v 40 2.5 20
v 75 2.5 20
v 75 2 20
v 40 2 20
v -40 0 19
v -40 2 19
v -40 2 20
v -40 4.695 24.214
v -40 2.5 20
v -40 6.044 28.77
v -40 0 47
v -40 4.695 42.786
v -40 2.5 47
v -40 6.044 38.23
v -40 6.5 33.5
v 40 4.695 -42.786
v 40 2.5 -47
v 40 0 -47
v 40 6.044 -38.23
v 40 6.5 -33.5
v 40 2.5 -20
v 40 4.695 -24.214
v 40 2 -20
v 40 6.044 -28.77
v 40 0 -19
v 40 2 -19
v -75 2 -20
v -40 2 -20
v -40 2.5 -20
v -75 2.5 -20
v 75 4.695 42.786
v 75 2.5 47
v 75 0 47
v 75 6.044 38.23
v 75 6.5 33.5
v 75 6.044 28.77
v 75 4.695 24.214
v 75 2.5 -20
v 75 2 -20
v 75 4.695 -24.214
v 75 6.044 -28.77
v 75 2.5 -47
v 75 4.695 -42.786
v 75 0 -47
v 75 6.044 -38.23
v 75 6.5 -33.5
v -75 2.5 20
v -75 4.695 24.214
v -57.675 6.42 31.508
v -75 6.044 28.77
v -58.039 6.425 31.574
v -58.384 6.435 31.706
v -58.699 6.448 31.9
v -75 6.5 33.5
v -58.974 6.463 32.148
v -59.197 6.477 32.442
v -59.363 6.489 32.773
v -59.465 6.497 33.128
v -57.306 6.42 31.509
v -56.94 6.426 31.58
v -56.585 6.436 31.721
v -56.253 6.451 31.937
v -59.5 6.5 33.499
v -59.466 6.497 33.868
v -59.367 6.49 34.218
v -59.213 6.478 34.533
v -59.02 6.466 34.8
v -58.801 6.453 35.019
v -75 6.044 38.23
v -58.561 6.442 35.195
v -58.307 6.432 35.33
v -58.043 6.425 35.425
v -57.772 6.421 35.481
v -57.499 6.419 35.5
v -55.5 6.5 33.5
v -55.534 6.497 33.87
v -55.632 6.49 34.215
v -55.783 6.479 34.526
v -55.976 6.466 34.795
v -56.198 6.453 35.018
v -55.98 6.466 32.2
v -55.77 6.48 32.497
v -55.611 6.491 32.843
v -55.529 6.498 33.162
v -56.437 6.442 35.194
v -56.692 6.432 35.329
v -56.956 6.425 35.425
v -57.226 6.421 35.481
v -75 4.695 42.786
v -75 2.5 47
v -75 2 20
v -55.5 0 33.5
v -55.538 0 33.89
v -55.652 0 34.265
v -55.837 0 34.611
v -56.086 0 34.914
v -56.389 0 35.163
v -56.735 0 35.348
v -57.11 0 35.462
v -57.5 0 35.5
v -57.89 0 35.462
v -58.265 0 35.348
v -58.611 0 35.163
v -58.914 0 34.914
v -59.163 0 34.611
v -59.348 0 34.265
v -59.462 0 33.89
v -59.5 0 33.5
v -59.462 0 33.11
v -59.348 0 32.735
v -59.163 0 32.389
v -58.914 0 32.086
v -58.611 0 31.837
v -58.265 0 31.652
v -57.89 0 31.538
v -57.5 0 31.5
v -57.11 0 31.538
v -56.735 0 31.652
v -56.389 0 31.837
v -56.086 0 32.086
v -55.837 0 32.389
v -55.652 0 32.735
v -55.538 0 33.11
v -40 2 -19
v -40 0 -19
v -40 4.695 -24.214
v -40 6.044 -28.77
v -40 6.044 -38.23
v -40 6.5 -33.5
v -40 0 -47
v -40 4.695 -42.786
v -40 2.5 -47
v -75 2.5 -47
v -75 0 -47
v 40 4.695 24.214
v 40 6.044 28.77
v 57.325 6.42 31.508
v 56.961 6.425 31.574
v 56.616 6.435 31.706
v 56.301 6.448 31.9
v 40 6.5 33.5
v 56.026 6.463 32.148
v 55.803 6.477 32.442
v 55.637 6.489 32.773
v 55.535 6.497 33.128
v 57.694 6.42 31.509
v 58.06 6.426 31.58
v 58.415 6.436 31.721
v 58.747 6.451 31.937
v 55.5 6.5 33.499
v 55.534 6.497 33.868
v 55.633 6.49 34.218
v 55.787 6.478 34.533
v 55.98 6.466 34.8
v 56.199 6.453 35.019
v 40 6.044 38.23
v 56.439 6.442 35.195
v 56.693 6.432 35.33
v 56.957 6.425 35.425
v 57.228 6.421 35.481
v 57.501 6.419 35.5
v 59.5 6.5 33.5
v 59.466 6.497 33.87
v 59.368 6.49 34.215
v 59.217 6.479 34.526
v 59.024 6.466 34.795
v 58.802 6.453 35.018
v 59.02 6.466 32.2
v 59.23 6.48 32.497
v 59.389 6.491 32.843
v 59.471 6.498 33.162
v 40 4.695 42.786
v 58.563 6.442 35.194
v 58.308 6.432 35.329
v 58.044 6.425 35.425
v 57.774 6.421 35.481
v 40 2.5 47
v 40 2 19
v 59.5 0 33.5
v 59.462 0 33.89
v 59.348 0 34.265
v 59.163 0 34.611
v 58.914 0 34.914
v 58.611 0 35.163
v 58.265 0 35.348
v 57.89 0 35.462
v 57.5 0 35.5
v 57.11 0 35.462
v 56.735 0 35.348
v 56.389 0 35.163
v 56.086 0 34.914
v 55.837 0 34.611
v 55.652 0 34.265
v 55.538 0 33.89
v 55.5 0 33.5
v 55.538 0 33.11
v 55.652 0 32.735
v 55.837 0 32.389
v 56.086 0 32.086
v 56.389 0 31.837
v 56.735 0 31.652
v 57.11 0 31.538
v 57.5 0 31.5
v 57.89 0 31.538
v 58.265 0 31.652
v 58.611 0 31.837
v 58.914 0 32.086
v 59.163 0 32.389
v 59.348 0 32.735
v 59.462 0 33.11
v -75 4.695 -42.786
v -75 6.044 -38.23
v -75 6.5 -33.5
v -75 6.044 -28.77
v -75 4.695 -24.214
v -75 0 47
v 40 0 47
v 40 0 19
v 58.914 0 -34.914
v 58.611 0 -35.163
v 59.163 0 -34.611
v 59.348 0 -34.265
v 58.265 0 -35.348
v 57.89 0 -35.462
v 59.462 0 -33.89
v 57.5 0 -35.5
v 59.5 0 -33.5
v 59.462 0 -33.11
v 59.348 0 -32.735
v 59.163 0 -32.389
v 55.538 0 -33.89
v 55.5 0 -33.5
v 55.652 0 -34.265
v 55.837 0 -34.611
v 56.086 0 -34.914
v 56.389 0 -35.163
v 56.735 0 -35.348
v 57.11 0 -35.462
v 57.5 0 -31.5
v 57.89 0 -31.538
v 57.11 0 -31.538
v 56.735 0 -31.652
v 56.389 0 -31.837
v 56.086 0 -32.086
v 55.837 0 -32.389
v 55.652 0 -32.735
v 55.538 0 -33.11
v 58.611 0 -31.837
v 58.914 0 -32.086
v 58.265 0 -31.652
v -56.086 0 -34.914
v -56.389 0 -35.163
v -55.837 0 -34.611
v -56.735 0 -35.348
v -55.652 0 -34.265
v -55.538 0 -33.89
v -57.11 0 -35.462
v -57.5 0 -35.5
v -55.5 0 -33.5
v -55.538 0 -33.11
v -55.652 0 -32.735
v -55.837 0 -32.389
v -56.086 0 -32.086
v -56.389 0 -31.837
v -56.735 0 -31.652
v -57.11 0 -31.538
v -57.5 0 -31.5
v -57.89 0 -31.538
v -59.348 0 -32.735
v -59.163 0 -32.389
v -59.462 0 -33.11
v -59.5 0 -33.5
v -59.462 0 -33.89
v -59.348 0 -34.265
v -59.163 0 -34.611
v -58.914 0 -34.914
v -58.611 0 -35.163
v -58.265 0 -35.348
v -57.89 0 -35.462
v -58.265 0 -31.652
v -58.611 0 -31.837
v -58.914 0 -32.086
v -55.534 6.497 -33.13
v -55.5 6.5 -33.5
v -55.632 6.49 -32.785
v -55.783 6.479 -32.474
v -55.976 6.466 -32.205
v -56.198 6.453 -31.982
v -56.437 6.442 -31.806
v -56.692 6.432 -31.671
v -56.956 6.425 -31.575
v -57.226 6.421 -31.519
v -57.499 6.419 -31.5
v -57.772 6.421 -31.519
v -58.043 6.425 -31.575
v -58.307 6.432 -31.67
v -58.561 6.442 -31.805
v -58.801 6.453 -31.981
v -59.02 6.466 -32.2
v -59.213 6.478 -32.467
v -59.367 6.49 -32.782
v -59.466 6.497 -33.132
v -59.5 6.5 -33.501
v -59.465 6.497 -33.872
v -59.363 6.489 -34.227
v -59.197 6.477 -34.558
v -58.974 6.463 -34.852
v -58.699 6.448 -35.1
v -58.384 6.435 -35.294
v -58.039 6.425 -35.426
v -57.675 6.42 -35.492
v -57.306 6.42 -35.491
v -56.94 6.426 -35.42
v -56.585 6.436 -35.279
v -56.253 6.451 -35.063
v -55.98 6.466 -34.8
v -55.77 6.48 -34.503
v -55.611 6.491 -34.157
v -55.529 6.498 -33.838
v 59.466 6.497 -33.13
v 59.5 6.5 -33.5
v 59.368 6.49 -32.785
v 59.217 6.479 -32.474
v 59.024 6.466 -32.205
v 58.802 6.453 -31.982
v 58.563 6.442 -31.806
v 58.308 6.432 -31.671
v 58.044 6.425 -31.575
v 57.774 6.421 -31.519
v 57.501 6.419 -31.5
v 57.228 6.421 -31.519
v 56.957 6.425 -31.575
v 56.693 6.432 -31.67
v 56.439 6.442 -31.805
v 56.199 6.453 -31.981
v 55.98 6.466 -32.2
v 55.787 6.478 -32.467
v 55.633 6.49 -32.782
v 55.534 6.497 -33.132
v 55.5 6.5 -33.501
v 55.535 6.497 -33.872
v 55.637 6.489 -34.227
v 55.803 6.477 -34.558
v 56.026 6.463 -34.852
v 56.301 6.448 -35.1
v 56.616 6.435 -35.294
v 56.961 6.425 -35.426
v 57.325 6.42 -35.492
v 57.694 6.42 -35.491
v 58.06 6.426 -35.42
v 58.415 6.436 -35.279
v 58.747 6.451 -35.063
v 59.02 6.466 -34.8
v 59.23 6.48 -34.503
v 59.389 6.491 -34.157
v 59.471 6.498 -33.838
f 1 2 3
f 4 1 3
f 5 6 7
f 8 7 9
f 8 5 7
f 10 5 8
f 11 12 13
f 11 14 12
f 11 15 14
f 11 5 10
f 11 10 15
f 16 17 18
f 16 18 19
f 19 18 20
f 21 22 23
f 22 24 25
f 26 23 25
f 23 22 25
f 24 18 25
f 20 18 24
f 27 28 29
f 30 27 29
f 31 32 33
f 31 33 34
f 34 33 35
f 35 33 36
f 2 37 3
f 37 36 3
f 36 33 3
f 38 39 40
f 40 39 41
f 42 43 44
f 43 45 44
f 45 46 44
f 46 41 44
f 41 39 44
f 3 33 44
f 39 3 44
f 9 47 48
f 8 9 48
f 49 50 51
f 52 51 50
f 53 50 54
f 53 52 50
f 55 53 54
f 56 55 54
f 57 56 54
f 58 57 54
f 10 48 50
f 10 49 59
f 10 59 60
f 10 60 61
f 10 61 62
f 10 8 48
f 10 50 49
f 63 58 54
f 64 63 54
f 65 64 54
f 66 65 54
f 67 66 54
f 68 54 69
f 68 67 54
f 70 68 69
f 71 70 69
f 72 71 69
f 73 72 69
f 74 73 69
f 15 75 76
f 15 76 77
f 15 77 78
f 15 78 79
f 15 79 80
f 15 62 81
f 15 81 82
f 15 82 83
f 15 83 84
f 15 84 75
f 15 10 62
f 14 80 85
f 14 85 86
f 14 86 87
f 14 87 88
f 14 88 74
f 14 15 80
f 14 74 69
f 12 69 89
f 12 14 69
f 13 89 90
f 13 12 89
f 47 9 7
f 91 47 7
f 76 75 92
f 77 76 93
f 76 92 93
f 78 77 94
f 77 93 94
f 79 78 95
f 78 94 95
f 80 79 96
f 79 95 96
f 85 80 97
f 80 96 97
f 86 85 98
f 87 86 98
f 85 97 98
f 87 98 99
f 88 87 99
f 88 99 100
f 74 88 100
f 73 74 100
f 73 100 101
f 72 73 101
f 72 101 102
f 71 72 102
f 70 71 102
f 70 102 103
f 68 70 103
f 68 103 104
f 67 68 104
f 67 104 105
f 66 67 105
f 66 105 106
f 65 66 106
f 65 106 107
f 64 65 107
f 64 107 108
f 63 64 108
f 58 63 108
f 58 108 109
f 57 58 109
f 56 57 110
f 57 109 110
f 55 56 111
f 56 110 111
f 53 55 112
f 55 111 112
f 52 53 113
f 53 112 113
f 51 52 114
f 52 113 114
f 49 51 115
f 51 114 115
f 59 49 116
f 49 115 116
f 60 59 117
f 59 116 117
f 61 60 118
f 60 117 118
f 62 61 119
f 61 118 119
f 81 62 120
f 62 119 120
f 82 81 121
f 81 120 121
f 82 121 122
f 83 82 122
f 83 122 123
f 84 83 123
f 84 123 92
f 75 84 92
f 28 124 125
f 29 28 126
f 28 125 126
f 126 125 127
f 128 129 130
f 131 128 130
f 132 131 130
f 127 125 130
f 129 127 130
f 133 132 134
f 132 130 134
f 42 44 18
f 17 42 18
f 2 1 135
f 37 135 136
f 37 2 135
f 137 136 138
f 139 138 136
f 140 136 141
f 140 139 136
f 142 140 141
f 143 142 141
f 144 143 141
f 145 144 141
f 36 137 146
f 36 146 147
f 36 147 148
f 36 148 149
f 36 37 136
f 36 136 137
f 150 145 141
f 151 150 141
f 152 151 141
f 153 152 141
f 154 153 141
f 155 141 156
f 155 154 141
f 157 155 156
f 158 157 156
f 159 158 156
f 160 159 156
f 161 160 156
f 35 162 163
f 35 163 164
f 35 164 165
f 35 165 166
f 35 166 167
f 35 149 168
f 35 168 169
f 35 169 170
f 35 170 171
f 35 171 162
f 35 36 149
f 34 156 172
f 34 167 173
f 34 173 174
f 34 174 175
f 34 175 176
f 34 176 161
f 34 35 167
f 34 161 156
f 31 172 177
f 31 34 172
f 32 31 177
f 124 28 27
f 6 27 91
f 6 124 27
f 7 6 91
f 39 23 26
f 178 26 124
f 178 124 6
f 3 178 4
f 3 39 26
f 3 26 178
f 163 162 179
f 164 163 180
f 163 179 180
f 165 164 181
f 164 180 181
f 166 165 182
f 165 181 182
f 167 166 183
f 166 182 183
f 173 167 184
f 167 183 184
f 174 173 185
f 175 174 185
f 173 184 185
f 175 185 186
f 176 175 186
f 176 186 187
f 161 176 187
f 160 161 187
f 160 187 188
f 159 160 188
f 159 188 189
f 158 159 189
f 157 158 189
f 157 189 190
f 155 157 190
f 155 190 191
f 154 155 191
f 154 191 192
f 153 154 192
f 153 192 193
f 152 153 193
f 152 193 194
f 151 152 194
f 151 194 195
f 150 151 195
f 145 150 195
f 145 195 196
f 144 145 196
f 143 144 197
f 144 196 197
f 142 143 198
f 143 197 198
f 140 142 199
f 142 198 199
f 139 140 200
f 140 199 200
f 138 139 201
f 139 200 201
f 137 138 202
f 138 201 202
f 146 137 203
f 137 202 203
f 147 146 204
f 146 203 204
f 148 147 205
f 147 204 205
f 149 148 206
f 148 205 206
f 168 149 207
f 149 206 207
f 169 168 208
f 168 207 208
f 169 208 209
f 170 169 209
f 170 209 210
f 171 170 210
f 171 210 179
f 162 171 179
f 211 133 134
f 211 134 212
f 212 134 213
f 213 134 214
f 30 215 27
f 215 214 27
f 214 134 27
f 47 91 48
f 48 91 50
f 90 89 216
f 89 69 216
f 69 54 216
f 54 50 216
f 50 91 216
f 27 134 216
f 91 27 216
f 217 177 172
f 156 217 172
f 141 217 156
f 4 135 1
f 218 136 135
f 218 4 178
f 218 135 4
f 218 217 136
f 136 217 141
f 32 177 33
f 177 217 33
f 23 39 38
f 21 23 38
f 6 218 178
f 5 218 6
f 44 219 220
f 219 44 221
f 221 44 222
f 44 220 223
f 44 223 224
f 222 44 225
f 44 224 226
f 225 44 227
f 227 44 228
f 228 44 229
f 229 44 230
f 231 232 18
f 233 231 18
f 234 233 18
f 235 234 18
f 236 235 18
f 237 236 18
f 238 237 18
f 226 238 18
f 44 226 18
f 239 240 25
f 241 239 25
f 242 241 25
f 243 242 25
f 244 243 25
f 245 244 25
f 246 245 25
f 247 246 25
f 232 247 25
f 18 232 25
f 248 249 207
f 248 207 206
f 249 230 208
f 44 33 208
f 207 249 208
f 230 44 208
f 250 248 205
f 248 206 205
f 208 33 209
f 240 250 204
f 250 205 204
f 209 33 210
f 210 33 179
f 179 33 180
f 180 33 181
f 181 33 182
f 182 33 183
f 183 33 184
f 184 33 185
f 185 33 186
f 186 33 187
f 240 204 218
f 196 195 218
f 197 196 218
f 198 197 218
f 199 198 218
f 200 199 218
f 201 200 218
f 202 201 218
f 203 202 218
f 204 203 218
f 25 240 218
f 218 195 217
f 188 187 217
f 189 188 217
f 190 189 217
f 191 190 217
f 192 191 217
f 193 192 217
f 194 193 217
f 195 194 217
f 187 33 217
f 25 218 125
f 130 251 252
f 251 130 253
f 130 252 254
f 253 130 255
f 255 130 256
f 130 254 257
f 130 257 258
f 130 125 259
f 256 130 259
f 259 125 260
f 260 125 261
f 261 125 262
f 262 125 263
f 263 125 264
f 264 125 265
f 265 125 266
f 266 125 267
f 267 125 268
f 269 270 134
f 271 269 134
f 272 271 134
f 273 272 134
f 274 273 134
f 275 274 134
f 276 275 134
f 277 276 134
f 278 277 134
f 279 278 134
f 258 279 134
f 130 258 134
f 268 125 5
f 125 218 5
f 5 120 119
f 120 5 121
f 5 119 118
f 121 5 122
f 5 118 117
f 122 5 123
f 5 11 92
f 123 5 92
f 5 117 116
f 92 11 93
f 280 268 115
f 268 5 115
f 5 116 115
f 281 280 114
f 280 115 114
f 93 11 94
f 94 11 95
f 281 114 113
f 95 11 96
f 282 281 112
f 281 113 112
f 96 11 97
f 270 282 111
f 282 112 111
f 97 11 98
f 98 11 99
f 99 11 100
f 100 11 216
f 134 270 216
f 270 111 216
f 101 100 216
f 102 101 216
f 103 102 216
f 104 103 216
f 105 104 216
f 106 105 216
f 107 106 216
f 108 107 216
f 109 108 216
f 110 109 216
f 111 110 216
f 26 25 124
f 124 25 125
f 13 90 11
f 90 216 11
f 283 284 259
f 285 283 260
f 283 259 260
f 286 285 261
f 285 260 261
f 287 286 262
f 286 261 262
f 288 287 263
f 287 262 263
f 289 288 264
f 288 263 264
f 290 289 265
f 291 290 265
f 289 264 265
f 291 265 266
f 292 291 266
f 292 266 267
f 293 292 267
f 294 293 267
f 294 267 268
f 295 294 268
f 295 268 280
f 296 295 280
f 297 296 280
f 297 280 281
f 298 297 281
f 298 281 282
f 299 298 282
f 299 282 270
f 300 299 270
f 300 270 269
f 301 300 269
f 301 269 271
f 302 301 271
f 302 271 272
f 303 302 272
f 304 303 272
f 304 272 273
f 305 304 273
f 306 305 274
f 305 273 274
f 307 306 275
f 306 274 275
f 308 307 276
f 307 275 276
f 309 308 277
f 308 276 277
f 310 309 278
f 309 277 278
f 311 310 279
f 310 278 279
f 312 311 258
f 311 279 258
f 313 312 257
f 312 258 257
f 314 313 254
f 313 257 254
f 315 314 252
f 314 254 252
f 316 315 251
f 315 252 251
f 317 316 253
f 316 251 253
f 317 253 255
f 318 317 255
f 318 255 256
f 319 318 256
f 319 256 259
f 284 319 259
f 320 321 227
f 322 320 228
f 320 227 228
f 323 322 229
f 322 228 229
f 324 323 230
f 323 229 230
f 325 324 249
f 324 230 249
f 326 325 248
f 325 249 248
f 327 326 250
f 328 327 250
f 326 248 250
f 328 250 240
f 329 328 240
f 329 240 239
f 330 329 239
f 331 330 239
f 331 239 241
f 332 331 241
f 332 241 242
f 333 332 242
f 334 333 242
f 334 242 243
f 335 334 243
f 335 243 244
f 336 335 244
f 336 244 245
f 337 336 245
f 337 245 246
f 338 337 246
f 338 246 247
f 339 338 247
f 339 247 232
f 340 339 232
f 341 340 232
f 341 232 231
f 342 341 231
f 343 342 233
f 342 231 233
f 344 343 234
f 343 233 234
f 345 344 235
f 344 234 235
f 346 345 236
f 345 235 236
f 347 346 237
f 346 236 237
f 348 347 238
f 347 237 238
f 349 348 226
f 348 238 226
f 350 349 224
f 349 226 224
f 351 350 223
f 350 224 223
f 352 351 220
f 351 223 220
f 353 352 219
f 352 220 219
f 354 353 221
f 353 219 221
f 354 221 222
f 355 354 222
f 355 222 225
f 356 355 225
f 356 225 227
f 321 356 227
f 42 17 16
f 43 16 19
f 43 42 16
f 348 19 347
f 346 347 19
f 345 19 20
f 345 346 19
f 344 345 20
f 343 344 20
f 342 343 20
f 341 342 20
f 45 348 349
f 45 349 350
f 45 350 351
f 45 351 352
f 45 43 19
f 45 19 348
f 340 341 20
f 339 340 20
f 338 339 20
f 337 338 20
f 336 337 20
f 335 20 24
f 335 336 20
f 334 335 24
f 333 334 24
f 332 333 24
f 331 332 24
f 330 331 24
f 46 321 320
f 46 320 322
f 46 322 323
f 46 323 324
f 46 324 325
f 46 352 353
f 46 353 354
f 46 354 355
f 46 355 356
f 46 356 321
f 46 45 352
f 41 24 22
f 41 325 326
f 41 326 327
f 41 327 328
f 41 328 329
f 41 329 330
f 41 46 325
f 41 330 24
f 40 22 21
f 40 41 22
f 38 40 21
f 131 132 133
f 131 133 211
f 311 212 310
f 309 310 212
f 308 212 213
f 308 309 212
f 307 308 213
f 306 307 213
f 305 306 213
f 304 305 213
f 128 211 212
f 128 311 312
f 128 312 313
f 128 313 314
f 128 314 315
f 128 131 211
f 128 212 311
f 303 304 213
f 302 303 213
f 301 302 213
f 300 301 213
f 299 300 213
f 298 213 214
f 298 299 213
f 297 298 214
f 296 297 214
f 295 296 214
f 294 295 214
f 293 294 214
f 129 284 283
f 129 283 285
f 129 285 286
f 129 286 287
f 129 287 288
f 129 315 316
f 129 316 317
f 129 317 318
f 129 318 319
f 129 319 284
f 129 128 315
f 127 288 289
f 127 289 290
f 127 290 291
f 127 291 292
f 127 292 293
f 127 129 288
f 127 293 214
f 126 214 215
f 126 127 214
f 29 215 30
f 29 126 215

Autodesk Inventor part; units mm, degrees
ref_plane "YZ Plane" through (0, 0, 0) normal (1, 0, 0) x (0, 1, 0)
ref_plane "XZ Plane" through (0, 0, 0) normal (0, 1, 0) x (-1, 0, 0)
ref_plane "XY Plane" through (0, 0, 0) normal (0, 0, 1) x (1, 0, 0)
sketch "Main Base Sketch" plane through (0, 0, 0) normal (0, 1, 0) x (-1, 0, 0)
  line L0 (75, -47) -> (75, 47)
  line L1 (-75, 47) -> (-75, -47)
  line L2 (-75, -47) -> (75, 47) construction
  line L3 (75, -47) -> (-75, 47) construction
  line L4 (-40, -47) -> (-40, -19)
  line L5 (-40, -19) -> (40, -19)
  line L6 (40, -19) -> (40, -47)
  line L7 (40, 19) -> (40, 47)
  line L8 (-40, 19) -> (40, 19)
  line L9 (-40, 47) -> (-40, 19)
  line L10 (75, 47) -> (40, 47)
  line L11 (-40, 47) -> (-75, 47)
  line L12 (-75, -47) -> (-40, -47)
  line L13 (40, -47) -> (75, -47)
  point P0 (0, 0)
  point P1 (0, 0)
  dimension "d0" = 94
  dimension "d1" = 35
  dimension "d2" = 35
  dimension "d3" = 80
  dimension "d4" = 150
  dimension "d5" = 28
  dimension "d6" = 94
  dimension "d8" = 80
  dimension "d9" = 28
  dimension "d27" = 28
  dimension "d28" = 38
  dimension "d37" = 0
extrude "Main Base Extrusion" add sketch "Main Base Sketch" along normal blind 6.5
sketch "Middle Cut Sketch" plane through (0, 6.5, 0) normal (0, 1, 0) x (1, 0, 0)
  line L0 (-75, 47) -> (-75, -47) projected
  line L1 (75, 19) -> (-75, 19)
  line L2 (-75, 19) -> (-75, -19)
  line L3 (-75, -19) -> (75, -19)
  line L4 (75, -19) -> (75, 19)
  line L5 (-40, -19) -> (40, -19) projected
  line L6 (75, -47) -> (75, 47) projected
  line L7 (40, 19) -> (-40, 19) projected
  point P0 (0, 0)
  dimension "d18" = 0
  dimension "d19" = 0
  dimension "d34" = 0
extrude "Middle Cut" cut sketch "Middle Cut Sketch" against normal blind 4.5
sketch "Arc Sketch" plane through (75, 0, 47) normal (1, 0, 0) x (0, 0, -1)
  line L0 (27, 9.9354) -> (27, -5.8008)
  line L1 (13.5, 9.3022) -> (13.5, -9.2521)
  line L2 (-4.6363, 2.5) -> (37.5698, 2.5)
  line L3 (94, 0) -> (0, 0) construction
  arc A0 (27, 2.5) -> (0, 2.5) centre (13.5, -18.2813) ccw
  line L4 (0, 8.4962) -> (0, -1.4448)
  line L5 (0, 0) -> (0, 6.5) projected
  line L6 (0, 6.5) -> (0, 2.5)
  line L7 (28, 6.5) -> (0, 6.5) projected
  line L8 (0, 6.5) -> (28, 6.5)
  line L9 (28, 2) -> (28, 6.5) projected
  line L10 (28, 6.5) -> (28, 2)
  line L11 (94, 0) -> (94, 6.5) projected
  line L12 (0, 6.5) -> (28, 6.5) projected
  line L13 (28, 2) -> (28, 6.5)
  line L14 (66, 2) -> (28, 2) projected
  line L15 (28, 2) -> (27, 2)
  line L16 (27, 2.5) -> (27, 2)
  dimension "d25" = 13.5
  dimension "d26" = 2.5
  dimension "d29" = 13.5
  dimension "d30" = 27
  dimension "d45" = 6.5
extrude "Arc Cut" cut sketch "Arc Sketch" against normal through all contours L2 L9 L15 L0 | A0 L7 L0 | L0 L7 L9 L2 | A0 L4 L7
mirror "Arc Mirror" about plane through (0, 0, 0) normal (0, 0, 1) of "Arc Cut"
sketch "Arc Holes Sketch" plane through (0, 0, 0) normal (0, -1, 0) x (1, 0, 0)
  circle A0 centre (57.5, 33.5) radius 2
  line L0 (75, -47) -> (75, 47) projected
  line L1 (40, 47) -> (40, 19) projected
  line L2 (40, 19) -> (-40, 19) projected
  line L3 (75, 47) -> (40, 47) projected
  line L4 (104.495, 0) -> (-129.4816, 0)
  line L5 (0, -57.7002) -> (0, 85.929)
  circle A1 centre (57.5, -33.5) radius 2
  circle A2 centre (-57.5, 33.5) radius 2
  circle A3 centre (-57.5, -33.5) radius 2
  point P0 (0, 0)
  dimension "d38" = 4
  dimension "d39" = 17.5
  dimension "d40" = 17.5
  dimension "d41" = 14.5
  dimension "d42" = 13.5
extrude "Arc Holes Cut" cut sketch "Arc Holes Sketch" against normal through all contours A0 | A1 | A2 | A3
properties part number "TapeMeasureBracketTop"
